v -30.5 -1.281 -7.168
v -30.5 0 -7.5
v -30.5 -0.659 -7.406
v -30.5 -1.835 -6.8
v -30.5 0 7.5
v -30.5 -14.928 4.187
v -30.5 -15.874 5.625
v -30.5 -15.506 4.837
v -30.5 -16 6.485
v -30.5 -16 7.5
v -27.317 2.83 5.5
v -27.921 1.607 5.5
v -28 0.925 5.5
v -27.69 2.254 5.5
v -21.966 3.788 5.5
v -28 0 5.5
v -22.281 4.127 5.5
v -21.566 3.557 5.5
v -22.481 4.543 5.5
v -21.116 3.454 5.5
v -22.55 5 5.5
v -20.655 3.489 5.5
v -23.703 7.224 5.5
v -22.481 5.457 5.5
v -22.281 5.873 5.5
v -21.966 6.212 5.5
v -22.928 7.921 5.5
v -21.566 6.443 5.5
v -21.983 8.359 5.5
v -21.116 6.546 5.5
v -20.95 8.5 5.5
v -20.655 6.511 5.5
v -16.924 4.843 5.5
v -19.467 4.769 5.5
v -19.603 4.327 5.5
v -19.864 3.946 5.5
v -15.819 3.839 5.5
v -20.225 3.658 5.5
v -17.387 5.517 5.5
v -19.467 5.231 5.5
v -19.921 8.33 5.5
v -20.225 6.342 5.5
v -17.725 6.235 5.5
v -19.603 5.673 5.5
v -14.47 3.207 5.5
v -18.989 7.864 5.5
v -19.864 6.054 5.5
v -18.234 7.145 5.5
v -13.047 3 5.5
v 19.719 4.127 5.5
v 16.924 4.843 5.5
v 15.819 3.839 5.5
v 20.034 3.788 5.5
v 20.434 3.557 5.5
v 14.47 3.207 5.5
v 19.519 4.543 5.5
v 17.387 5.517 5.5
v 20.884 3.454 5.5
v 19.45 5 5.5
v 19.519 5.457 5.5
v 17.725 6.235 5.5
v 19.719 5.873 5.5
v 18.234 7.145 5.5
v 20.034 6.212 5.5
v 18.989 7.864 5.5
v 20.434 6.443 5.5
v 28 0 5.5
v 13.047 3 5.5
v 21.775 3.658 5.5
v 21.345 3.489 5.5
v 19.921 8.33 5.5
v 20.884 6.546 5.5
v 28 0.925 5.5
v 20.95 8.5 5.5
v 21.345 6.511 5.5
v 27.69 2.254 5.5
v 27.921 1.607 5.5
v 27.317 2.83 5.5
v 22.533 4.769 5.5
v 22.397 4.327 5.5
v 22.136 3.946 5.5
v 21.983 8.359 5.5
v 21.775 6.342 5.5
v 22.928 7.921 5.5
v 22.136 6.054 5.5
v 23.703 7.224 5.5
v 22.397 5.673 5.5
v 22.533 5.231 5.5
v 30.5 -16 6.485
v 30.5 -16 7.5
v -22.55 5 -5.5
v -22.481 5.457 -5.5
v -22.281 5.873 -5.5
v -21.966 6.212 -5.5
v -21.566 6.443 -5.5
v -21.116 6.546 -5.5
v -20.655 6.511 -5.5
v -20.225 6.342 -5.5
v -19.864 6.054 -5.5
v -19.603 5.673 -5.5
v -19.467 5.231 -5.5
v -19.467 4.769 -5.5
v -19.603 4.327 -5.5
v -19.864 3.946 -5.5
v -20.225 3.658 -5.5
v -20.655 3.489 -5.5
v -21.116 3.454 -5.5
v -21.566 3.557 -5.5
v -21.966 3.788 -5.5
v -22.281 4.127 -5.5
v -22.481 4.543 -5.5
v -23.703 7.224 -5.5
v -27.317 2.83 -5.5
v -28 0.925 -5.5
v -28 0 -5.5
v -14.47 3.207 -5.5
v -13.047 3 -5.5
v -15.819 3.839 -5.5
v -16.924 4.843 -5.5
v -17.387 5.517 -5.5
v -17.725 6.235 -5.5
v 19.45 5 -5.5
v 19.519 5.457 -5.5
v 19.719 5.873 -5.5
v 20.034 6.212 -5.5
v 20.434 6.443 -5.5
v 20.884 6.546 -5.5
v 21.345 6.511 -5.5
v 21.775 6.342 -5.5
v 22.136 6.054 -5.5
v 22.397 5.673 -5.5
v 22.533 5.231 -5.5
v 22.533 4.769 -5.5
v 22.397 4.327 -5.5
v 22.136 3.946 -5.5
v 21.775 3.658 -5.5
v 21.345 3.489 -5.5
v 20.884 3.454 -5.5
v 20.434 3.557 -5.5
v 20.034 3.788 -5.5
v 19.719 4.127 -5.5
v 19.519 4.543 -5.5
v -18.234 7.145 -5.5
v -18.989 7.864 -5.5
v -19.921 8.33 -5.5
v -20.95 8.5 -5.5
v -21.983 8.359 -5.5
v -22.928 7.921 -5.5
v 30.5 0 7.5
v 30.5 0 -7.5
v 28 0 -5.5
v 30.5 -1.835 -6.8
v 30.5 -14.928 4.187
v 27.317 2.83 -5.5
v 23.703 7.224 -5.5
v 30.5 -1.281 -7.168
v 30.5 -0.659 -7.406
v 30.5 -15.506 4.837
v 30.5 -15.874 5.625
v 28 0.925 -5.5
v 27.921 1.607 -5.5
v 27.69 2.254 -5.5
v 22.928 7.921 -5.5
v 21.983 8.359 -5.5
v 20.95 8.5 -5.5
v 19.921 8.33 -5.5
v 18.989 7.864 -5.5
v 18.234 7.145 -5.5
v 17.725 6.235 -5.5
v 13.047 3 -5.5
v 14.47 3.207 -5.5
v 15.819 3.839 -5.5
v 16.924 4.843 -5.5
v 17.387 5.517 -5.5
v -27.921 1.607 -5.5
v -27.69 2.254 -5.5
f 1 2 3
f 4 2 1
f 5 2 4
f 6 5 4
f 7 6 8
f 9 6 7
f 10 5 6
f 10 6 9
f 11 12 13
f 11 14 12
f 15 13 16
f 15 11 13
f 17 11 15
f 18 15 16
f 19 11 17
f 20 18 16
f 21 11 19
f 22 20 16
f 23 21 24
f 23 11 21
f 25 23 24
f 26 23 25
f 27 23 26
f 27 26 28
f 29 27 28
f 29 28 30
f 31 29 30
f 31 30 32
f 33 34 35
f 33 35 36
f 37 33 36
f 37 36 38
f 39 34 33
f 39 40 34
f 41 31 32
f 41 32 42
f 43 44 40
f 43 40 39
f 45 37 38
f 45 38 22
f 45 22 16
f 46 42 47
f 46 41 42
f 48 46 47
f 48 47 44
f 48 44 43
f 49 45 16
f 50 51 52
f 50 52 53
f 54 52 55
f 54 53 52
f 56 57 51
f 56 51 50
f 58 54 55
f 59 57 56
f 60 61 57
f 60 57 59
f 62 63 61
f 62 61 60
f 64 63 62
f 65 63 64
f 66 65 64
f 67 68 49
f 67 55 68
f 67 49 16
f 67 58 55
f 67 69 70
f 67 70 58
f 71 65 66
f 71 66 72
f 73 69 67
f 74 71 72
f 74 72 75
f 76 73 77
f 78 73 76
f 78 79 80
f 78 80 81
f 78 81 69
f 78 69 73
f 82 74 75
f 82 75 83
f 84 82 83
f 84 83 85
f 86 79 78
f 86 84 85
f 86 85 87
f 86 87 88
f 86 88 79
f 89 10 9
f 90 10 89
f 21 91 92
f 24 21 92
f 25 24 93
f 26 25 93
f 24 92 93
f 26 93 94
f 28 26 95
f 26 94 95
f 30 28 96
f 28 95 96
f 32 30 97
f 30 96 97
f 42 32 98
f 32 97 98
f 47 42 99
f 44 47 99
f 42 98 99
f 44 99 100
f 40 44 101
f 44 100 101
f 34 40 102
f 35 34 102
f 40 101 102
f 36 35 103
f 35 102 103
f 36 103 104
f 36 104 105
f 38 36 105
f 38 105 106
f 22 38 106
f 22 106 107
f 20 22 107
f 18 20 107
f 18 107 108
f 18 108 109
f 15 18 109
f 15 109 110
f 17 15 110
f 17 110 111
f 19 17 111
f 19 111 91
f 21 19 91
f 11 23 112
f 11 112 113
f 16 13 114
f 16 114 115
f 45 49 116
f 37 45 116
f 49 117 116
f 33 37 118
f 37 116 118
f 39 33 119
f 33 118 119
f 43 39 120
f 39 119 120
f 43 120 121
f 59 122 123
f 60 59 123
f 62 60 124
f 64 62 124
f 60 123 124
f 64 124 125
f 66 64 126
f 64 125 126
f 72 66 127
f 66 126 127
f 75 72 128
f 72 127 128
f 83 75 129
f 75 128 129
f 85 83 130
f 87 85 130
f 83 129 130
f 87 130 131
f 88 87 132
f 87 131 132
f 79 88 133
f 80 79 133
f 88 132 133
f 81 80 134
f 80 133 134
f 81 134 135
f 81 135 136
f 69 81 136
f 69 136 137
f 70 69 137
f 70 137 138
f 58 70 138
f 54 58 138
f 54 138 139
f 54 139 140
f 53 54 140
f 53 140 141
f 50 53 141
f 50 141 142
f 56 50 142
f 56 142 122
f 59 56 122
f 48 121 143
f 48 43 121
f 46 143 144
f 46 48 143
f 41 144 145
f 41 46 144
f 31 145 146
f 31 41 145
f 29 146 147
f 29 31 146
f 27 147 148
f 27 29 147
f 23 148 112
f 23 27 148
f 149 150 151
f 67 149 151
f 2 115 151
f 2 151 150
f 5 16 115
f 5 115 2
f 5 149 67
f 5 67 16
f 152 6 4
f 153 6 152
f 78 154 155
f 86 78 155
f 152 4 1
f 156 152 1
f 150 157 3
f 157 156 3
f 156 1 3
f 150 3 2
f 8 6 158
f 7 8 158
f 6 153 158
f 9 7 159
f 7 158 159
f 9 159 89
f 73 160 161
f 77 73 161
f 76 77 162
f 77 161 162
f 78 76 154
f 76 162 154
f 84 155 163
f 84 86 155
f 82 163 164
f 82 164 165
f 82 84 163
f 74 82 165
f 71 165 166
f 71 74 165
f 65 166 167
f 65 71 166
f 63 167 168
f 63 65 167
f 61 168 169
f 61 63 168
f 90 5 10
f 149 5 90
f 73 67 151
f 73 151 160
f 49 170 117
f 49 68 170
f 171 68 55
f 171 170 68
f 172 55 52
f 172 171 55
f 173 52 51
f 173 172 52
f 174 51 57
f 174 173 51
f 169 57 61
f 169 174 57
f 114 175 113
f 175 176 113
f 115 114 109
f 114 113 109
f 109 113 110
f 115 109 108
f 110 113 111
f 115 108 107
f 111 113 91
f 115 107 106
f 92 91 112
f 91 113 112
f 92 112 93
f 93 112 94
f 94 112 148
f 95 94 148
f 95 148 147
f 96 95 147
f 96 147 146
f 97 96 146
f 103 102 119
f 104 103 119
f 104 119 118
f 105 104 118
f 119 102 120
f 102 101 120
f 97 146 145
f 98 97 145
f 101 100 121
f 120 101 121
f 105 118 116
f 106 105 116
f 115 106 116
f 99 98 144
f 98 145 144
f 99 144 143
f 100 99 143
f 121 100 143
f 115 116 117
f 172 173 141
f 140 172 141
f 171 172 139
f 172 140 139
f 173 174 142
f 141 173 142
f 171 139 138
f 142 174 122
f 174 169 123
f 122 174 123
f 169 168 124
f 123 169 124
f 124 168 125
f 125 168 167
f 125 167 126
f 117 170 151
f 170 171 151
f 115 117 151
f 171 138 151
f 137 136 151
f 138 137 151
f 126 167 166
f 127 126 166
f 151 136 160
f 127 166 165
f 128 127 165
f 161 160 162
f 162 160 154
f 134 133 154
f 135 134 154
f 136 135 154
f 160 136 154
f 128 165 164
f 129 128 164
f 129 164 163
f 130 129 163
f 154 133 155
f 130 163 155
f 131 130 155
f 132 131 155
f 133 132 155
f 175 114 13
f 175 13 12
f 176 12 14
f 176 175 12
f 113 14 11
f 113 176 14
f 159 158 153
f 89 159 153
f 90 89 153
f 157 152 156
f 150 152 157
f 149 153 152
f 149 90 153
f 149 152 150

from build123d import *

# Parameters (mm, degrees)
F1_DEPTH    = 7.5
F2_DEPTH    = 5.5
F3_SIZE2    = 12.5864944677
F3_SIZE     = 15
F5_D        = 3.1
F6_R        = 3
F7_T1_DEPTH = 66.4481797844
F7_T3_DEPTH = 16.376963756
F8_R        = 5


# Not quite as in the source:
# - a fillet or chamfer that OpenCascade refuses, or shapes differently, is made with other operations: its cross-section is extruded or revolved along the edge and cut away or added


with BuildPart() as f1:
    # F0 (on Top) → F1 (new body, symmetric)
    with BuildSketch(Plane.XY):
        Polygon((28, 0), (0, 0), (0, -16), (30.5, -16), (30.5, 0), align=None)
        Polygon((0, 0), (-28, 0), (-30.5, 0), (-30.5, -16), (0, -16), align=None)
    extrude(amount=F1_DEPTH, both=True)

    # F0 (on Top) → F2 (join, symmetric)
    with BuildSketch(Plane.XY):
        with BuildLine():
            Line((-17.5, 3), (-17.5, 5))
            ThreePointArc((-17.5, 5), (-22.1810377062, 1.7052845439), (-23.7029428208, 7.2235332486))
            Line((-23.7029428208, 7.2235332486), (-28, 2))
            Line((-28, 2), (-28, 0))
            Line((-28, 0), (0, 0))
            Line((0, 0), (0, 3))
            Line((0, 3), (-17.5, 3))
        make_face()
        with BuildLine():
            ThreePointArc((-23.7029428208, 7.2235332486), (-22.1810377062, 1.7052845439), (-17.5, 5))
            ThreePointArc((-17.5, 5), (-19.8189622938, 8.2947154561), (-23.7029428208, 7.2235332486))
        make_face()
        with BuildLine():
            ThreePointArc((23.7029428208, 7.2235332486), (19.8189622938, 8.2947154561), (17.5, 5))
            ThreePointArc((17.5, 5), (21, 1.5), (24.5, 5))
            ThreePointArc((24.5, 5), (24.2947154561, 6.1810377062), (23.7029428208, 7.2235332486))
        make_face()
        with BuildLine():
            Line((17.5, 3), (0, 3))
            Line((0, 3), (0, 0))
            Line((0, 0), (28, 0))
            Line((28, 0), (28, 2))
            Line((28, 2), (23.7029428208, 7.2235332486))
            ThreePointArc((23.7029428208, 7.2235332486), (24.2947154561, 6.1810377062), (24.5, 5))
            ThreePointArc((24.5, 5), (21, 1.5), (17.5, 5))
            Line((17.5, 5), (17.5, 3))
        make_face()
    extrude(amount=F2_DEPTH, both=True)

    # F3
    f3_edges = [f1.edges().sort_by_distance(p)[0] for p in [
        (0, -16, -7.5),
    ]]
    f3_side = f1.faces().sort_by_distance((0, -8, -7.5))[0]
    chamfer(f3_edges, length=F3_SIZE, length2=F3_SIZE2, reference=f3_side)

    # F5 (through all)
    with Locations(Plane.XY.offset(5.5)):
        with Locations((-21, 5), (21, 5)):
            Hole(F5_D / 2)

    # F6
    f6_edges = [f1.edges().sort_by_distance(p)[0] for p in [
        (0, -16, 5.086494),
    ]]
    fillet(f6_edges, radius=F6_R)

    # F7: fillet of radius 3 on 3 edges, made by hand

    # F7_s2 → F7_t1 (cut)
    with BuildSketch(Plane.YZ.offset(-33.2240898922)):
        with BuildLine():
            ThreePointArc((-1.8347095698, -6.7995955078), (-0.9762901404, -7.3041789179), (0, -7.5))
            Line((0, -7.5), (-1, -7.5))
            Line((-1, -7.5), (-1.8347095698, -6.7995955078))
        make_face()
    extrude(amount=F7_T1_DEPTH, mode=Mode.SUBTRACT)

    # F7_s4 → F7_t3 (cut)
    with BuildSketch(Plane.XY.offset(-8.188481878)):
        with BuildLine():
            ThreePointArc((-28, 0.9246072488), (-27.8240418195, 1.9369252827), (-27.3168081321, 2.8304928904))
            Line((-27.3168081321, 2.8304928904), (-28, 2))
            Line((-28, 2), (-28, 0.9246072488))
        make_face()
        with BuildLine():
            ThreePointArc((28, 0.9246072488), (27.8240418195, 1.9369252827), (27.3168081321, 2.8304928904))
            Line((27.3168081321, 2.8304928904), (28, 2))
            Line((28, 2), (28, 0.9246072488))
        make_face()
    extrude(amount=F7_T3_DEPTH, mode=Mode.SUBTRACT)

    # F8
    f8_edges = [f1.edges().sort_by_distance(p)[0] for p in [
        (17.5, 3, 0),
        (-17.5, 3, 0),
    ]]
    fillet(f8_edges, radius=F8_R)


solid = f1.part
